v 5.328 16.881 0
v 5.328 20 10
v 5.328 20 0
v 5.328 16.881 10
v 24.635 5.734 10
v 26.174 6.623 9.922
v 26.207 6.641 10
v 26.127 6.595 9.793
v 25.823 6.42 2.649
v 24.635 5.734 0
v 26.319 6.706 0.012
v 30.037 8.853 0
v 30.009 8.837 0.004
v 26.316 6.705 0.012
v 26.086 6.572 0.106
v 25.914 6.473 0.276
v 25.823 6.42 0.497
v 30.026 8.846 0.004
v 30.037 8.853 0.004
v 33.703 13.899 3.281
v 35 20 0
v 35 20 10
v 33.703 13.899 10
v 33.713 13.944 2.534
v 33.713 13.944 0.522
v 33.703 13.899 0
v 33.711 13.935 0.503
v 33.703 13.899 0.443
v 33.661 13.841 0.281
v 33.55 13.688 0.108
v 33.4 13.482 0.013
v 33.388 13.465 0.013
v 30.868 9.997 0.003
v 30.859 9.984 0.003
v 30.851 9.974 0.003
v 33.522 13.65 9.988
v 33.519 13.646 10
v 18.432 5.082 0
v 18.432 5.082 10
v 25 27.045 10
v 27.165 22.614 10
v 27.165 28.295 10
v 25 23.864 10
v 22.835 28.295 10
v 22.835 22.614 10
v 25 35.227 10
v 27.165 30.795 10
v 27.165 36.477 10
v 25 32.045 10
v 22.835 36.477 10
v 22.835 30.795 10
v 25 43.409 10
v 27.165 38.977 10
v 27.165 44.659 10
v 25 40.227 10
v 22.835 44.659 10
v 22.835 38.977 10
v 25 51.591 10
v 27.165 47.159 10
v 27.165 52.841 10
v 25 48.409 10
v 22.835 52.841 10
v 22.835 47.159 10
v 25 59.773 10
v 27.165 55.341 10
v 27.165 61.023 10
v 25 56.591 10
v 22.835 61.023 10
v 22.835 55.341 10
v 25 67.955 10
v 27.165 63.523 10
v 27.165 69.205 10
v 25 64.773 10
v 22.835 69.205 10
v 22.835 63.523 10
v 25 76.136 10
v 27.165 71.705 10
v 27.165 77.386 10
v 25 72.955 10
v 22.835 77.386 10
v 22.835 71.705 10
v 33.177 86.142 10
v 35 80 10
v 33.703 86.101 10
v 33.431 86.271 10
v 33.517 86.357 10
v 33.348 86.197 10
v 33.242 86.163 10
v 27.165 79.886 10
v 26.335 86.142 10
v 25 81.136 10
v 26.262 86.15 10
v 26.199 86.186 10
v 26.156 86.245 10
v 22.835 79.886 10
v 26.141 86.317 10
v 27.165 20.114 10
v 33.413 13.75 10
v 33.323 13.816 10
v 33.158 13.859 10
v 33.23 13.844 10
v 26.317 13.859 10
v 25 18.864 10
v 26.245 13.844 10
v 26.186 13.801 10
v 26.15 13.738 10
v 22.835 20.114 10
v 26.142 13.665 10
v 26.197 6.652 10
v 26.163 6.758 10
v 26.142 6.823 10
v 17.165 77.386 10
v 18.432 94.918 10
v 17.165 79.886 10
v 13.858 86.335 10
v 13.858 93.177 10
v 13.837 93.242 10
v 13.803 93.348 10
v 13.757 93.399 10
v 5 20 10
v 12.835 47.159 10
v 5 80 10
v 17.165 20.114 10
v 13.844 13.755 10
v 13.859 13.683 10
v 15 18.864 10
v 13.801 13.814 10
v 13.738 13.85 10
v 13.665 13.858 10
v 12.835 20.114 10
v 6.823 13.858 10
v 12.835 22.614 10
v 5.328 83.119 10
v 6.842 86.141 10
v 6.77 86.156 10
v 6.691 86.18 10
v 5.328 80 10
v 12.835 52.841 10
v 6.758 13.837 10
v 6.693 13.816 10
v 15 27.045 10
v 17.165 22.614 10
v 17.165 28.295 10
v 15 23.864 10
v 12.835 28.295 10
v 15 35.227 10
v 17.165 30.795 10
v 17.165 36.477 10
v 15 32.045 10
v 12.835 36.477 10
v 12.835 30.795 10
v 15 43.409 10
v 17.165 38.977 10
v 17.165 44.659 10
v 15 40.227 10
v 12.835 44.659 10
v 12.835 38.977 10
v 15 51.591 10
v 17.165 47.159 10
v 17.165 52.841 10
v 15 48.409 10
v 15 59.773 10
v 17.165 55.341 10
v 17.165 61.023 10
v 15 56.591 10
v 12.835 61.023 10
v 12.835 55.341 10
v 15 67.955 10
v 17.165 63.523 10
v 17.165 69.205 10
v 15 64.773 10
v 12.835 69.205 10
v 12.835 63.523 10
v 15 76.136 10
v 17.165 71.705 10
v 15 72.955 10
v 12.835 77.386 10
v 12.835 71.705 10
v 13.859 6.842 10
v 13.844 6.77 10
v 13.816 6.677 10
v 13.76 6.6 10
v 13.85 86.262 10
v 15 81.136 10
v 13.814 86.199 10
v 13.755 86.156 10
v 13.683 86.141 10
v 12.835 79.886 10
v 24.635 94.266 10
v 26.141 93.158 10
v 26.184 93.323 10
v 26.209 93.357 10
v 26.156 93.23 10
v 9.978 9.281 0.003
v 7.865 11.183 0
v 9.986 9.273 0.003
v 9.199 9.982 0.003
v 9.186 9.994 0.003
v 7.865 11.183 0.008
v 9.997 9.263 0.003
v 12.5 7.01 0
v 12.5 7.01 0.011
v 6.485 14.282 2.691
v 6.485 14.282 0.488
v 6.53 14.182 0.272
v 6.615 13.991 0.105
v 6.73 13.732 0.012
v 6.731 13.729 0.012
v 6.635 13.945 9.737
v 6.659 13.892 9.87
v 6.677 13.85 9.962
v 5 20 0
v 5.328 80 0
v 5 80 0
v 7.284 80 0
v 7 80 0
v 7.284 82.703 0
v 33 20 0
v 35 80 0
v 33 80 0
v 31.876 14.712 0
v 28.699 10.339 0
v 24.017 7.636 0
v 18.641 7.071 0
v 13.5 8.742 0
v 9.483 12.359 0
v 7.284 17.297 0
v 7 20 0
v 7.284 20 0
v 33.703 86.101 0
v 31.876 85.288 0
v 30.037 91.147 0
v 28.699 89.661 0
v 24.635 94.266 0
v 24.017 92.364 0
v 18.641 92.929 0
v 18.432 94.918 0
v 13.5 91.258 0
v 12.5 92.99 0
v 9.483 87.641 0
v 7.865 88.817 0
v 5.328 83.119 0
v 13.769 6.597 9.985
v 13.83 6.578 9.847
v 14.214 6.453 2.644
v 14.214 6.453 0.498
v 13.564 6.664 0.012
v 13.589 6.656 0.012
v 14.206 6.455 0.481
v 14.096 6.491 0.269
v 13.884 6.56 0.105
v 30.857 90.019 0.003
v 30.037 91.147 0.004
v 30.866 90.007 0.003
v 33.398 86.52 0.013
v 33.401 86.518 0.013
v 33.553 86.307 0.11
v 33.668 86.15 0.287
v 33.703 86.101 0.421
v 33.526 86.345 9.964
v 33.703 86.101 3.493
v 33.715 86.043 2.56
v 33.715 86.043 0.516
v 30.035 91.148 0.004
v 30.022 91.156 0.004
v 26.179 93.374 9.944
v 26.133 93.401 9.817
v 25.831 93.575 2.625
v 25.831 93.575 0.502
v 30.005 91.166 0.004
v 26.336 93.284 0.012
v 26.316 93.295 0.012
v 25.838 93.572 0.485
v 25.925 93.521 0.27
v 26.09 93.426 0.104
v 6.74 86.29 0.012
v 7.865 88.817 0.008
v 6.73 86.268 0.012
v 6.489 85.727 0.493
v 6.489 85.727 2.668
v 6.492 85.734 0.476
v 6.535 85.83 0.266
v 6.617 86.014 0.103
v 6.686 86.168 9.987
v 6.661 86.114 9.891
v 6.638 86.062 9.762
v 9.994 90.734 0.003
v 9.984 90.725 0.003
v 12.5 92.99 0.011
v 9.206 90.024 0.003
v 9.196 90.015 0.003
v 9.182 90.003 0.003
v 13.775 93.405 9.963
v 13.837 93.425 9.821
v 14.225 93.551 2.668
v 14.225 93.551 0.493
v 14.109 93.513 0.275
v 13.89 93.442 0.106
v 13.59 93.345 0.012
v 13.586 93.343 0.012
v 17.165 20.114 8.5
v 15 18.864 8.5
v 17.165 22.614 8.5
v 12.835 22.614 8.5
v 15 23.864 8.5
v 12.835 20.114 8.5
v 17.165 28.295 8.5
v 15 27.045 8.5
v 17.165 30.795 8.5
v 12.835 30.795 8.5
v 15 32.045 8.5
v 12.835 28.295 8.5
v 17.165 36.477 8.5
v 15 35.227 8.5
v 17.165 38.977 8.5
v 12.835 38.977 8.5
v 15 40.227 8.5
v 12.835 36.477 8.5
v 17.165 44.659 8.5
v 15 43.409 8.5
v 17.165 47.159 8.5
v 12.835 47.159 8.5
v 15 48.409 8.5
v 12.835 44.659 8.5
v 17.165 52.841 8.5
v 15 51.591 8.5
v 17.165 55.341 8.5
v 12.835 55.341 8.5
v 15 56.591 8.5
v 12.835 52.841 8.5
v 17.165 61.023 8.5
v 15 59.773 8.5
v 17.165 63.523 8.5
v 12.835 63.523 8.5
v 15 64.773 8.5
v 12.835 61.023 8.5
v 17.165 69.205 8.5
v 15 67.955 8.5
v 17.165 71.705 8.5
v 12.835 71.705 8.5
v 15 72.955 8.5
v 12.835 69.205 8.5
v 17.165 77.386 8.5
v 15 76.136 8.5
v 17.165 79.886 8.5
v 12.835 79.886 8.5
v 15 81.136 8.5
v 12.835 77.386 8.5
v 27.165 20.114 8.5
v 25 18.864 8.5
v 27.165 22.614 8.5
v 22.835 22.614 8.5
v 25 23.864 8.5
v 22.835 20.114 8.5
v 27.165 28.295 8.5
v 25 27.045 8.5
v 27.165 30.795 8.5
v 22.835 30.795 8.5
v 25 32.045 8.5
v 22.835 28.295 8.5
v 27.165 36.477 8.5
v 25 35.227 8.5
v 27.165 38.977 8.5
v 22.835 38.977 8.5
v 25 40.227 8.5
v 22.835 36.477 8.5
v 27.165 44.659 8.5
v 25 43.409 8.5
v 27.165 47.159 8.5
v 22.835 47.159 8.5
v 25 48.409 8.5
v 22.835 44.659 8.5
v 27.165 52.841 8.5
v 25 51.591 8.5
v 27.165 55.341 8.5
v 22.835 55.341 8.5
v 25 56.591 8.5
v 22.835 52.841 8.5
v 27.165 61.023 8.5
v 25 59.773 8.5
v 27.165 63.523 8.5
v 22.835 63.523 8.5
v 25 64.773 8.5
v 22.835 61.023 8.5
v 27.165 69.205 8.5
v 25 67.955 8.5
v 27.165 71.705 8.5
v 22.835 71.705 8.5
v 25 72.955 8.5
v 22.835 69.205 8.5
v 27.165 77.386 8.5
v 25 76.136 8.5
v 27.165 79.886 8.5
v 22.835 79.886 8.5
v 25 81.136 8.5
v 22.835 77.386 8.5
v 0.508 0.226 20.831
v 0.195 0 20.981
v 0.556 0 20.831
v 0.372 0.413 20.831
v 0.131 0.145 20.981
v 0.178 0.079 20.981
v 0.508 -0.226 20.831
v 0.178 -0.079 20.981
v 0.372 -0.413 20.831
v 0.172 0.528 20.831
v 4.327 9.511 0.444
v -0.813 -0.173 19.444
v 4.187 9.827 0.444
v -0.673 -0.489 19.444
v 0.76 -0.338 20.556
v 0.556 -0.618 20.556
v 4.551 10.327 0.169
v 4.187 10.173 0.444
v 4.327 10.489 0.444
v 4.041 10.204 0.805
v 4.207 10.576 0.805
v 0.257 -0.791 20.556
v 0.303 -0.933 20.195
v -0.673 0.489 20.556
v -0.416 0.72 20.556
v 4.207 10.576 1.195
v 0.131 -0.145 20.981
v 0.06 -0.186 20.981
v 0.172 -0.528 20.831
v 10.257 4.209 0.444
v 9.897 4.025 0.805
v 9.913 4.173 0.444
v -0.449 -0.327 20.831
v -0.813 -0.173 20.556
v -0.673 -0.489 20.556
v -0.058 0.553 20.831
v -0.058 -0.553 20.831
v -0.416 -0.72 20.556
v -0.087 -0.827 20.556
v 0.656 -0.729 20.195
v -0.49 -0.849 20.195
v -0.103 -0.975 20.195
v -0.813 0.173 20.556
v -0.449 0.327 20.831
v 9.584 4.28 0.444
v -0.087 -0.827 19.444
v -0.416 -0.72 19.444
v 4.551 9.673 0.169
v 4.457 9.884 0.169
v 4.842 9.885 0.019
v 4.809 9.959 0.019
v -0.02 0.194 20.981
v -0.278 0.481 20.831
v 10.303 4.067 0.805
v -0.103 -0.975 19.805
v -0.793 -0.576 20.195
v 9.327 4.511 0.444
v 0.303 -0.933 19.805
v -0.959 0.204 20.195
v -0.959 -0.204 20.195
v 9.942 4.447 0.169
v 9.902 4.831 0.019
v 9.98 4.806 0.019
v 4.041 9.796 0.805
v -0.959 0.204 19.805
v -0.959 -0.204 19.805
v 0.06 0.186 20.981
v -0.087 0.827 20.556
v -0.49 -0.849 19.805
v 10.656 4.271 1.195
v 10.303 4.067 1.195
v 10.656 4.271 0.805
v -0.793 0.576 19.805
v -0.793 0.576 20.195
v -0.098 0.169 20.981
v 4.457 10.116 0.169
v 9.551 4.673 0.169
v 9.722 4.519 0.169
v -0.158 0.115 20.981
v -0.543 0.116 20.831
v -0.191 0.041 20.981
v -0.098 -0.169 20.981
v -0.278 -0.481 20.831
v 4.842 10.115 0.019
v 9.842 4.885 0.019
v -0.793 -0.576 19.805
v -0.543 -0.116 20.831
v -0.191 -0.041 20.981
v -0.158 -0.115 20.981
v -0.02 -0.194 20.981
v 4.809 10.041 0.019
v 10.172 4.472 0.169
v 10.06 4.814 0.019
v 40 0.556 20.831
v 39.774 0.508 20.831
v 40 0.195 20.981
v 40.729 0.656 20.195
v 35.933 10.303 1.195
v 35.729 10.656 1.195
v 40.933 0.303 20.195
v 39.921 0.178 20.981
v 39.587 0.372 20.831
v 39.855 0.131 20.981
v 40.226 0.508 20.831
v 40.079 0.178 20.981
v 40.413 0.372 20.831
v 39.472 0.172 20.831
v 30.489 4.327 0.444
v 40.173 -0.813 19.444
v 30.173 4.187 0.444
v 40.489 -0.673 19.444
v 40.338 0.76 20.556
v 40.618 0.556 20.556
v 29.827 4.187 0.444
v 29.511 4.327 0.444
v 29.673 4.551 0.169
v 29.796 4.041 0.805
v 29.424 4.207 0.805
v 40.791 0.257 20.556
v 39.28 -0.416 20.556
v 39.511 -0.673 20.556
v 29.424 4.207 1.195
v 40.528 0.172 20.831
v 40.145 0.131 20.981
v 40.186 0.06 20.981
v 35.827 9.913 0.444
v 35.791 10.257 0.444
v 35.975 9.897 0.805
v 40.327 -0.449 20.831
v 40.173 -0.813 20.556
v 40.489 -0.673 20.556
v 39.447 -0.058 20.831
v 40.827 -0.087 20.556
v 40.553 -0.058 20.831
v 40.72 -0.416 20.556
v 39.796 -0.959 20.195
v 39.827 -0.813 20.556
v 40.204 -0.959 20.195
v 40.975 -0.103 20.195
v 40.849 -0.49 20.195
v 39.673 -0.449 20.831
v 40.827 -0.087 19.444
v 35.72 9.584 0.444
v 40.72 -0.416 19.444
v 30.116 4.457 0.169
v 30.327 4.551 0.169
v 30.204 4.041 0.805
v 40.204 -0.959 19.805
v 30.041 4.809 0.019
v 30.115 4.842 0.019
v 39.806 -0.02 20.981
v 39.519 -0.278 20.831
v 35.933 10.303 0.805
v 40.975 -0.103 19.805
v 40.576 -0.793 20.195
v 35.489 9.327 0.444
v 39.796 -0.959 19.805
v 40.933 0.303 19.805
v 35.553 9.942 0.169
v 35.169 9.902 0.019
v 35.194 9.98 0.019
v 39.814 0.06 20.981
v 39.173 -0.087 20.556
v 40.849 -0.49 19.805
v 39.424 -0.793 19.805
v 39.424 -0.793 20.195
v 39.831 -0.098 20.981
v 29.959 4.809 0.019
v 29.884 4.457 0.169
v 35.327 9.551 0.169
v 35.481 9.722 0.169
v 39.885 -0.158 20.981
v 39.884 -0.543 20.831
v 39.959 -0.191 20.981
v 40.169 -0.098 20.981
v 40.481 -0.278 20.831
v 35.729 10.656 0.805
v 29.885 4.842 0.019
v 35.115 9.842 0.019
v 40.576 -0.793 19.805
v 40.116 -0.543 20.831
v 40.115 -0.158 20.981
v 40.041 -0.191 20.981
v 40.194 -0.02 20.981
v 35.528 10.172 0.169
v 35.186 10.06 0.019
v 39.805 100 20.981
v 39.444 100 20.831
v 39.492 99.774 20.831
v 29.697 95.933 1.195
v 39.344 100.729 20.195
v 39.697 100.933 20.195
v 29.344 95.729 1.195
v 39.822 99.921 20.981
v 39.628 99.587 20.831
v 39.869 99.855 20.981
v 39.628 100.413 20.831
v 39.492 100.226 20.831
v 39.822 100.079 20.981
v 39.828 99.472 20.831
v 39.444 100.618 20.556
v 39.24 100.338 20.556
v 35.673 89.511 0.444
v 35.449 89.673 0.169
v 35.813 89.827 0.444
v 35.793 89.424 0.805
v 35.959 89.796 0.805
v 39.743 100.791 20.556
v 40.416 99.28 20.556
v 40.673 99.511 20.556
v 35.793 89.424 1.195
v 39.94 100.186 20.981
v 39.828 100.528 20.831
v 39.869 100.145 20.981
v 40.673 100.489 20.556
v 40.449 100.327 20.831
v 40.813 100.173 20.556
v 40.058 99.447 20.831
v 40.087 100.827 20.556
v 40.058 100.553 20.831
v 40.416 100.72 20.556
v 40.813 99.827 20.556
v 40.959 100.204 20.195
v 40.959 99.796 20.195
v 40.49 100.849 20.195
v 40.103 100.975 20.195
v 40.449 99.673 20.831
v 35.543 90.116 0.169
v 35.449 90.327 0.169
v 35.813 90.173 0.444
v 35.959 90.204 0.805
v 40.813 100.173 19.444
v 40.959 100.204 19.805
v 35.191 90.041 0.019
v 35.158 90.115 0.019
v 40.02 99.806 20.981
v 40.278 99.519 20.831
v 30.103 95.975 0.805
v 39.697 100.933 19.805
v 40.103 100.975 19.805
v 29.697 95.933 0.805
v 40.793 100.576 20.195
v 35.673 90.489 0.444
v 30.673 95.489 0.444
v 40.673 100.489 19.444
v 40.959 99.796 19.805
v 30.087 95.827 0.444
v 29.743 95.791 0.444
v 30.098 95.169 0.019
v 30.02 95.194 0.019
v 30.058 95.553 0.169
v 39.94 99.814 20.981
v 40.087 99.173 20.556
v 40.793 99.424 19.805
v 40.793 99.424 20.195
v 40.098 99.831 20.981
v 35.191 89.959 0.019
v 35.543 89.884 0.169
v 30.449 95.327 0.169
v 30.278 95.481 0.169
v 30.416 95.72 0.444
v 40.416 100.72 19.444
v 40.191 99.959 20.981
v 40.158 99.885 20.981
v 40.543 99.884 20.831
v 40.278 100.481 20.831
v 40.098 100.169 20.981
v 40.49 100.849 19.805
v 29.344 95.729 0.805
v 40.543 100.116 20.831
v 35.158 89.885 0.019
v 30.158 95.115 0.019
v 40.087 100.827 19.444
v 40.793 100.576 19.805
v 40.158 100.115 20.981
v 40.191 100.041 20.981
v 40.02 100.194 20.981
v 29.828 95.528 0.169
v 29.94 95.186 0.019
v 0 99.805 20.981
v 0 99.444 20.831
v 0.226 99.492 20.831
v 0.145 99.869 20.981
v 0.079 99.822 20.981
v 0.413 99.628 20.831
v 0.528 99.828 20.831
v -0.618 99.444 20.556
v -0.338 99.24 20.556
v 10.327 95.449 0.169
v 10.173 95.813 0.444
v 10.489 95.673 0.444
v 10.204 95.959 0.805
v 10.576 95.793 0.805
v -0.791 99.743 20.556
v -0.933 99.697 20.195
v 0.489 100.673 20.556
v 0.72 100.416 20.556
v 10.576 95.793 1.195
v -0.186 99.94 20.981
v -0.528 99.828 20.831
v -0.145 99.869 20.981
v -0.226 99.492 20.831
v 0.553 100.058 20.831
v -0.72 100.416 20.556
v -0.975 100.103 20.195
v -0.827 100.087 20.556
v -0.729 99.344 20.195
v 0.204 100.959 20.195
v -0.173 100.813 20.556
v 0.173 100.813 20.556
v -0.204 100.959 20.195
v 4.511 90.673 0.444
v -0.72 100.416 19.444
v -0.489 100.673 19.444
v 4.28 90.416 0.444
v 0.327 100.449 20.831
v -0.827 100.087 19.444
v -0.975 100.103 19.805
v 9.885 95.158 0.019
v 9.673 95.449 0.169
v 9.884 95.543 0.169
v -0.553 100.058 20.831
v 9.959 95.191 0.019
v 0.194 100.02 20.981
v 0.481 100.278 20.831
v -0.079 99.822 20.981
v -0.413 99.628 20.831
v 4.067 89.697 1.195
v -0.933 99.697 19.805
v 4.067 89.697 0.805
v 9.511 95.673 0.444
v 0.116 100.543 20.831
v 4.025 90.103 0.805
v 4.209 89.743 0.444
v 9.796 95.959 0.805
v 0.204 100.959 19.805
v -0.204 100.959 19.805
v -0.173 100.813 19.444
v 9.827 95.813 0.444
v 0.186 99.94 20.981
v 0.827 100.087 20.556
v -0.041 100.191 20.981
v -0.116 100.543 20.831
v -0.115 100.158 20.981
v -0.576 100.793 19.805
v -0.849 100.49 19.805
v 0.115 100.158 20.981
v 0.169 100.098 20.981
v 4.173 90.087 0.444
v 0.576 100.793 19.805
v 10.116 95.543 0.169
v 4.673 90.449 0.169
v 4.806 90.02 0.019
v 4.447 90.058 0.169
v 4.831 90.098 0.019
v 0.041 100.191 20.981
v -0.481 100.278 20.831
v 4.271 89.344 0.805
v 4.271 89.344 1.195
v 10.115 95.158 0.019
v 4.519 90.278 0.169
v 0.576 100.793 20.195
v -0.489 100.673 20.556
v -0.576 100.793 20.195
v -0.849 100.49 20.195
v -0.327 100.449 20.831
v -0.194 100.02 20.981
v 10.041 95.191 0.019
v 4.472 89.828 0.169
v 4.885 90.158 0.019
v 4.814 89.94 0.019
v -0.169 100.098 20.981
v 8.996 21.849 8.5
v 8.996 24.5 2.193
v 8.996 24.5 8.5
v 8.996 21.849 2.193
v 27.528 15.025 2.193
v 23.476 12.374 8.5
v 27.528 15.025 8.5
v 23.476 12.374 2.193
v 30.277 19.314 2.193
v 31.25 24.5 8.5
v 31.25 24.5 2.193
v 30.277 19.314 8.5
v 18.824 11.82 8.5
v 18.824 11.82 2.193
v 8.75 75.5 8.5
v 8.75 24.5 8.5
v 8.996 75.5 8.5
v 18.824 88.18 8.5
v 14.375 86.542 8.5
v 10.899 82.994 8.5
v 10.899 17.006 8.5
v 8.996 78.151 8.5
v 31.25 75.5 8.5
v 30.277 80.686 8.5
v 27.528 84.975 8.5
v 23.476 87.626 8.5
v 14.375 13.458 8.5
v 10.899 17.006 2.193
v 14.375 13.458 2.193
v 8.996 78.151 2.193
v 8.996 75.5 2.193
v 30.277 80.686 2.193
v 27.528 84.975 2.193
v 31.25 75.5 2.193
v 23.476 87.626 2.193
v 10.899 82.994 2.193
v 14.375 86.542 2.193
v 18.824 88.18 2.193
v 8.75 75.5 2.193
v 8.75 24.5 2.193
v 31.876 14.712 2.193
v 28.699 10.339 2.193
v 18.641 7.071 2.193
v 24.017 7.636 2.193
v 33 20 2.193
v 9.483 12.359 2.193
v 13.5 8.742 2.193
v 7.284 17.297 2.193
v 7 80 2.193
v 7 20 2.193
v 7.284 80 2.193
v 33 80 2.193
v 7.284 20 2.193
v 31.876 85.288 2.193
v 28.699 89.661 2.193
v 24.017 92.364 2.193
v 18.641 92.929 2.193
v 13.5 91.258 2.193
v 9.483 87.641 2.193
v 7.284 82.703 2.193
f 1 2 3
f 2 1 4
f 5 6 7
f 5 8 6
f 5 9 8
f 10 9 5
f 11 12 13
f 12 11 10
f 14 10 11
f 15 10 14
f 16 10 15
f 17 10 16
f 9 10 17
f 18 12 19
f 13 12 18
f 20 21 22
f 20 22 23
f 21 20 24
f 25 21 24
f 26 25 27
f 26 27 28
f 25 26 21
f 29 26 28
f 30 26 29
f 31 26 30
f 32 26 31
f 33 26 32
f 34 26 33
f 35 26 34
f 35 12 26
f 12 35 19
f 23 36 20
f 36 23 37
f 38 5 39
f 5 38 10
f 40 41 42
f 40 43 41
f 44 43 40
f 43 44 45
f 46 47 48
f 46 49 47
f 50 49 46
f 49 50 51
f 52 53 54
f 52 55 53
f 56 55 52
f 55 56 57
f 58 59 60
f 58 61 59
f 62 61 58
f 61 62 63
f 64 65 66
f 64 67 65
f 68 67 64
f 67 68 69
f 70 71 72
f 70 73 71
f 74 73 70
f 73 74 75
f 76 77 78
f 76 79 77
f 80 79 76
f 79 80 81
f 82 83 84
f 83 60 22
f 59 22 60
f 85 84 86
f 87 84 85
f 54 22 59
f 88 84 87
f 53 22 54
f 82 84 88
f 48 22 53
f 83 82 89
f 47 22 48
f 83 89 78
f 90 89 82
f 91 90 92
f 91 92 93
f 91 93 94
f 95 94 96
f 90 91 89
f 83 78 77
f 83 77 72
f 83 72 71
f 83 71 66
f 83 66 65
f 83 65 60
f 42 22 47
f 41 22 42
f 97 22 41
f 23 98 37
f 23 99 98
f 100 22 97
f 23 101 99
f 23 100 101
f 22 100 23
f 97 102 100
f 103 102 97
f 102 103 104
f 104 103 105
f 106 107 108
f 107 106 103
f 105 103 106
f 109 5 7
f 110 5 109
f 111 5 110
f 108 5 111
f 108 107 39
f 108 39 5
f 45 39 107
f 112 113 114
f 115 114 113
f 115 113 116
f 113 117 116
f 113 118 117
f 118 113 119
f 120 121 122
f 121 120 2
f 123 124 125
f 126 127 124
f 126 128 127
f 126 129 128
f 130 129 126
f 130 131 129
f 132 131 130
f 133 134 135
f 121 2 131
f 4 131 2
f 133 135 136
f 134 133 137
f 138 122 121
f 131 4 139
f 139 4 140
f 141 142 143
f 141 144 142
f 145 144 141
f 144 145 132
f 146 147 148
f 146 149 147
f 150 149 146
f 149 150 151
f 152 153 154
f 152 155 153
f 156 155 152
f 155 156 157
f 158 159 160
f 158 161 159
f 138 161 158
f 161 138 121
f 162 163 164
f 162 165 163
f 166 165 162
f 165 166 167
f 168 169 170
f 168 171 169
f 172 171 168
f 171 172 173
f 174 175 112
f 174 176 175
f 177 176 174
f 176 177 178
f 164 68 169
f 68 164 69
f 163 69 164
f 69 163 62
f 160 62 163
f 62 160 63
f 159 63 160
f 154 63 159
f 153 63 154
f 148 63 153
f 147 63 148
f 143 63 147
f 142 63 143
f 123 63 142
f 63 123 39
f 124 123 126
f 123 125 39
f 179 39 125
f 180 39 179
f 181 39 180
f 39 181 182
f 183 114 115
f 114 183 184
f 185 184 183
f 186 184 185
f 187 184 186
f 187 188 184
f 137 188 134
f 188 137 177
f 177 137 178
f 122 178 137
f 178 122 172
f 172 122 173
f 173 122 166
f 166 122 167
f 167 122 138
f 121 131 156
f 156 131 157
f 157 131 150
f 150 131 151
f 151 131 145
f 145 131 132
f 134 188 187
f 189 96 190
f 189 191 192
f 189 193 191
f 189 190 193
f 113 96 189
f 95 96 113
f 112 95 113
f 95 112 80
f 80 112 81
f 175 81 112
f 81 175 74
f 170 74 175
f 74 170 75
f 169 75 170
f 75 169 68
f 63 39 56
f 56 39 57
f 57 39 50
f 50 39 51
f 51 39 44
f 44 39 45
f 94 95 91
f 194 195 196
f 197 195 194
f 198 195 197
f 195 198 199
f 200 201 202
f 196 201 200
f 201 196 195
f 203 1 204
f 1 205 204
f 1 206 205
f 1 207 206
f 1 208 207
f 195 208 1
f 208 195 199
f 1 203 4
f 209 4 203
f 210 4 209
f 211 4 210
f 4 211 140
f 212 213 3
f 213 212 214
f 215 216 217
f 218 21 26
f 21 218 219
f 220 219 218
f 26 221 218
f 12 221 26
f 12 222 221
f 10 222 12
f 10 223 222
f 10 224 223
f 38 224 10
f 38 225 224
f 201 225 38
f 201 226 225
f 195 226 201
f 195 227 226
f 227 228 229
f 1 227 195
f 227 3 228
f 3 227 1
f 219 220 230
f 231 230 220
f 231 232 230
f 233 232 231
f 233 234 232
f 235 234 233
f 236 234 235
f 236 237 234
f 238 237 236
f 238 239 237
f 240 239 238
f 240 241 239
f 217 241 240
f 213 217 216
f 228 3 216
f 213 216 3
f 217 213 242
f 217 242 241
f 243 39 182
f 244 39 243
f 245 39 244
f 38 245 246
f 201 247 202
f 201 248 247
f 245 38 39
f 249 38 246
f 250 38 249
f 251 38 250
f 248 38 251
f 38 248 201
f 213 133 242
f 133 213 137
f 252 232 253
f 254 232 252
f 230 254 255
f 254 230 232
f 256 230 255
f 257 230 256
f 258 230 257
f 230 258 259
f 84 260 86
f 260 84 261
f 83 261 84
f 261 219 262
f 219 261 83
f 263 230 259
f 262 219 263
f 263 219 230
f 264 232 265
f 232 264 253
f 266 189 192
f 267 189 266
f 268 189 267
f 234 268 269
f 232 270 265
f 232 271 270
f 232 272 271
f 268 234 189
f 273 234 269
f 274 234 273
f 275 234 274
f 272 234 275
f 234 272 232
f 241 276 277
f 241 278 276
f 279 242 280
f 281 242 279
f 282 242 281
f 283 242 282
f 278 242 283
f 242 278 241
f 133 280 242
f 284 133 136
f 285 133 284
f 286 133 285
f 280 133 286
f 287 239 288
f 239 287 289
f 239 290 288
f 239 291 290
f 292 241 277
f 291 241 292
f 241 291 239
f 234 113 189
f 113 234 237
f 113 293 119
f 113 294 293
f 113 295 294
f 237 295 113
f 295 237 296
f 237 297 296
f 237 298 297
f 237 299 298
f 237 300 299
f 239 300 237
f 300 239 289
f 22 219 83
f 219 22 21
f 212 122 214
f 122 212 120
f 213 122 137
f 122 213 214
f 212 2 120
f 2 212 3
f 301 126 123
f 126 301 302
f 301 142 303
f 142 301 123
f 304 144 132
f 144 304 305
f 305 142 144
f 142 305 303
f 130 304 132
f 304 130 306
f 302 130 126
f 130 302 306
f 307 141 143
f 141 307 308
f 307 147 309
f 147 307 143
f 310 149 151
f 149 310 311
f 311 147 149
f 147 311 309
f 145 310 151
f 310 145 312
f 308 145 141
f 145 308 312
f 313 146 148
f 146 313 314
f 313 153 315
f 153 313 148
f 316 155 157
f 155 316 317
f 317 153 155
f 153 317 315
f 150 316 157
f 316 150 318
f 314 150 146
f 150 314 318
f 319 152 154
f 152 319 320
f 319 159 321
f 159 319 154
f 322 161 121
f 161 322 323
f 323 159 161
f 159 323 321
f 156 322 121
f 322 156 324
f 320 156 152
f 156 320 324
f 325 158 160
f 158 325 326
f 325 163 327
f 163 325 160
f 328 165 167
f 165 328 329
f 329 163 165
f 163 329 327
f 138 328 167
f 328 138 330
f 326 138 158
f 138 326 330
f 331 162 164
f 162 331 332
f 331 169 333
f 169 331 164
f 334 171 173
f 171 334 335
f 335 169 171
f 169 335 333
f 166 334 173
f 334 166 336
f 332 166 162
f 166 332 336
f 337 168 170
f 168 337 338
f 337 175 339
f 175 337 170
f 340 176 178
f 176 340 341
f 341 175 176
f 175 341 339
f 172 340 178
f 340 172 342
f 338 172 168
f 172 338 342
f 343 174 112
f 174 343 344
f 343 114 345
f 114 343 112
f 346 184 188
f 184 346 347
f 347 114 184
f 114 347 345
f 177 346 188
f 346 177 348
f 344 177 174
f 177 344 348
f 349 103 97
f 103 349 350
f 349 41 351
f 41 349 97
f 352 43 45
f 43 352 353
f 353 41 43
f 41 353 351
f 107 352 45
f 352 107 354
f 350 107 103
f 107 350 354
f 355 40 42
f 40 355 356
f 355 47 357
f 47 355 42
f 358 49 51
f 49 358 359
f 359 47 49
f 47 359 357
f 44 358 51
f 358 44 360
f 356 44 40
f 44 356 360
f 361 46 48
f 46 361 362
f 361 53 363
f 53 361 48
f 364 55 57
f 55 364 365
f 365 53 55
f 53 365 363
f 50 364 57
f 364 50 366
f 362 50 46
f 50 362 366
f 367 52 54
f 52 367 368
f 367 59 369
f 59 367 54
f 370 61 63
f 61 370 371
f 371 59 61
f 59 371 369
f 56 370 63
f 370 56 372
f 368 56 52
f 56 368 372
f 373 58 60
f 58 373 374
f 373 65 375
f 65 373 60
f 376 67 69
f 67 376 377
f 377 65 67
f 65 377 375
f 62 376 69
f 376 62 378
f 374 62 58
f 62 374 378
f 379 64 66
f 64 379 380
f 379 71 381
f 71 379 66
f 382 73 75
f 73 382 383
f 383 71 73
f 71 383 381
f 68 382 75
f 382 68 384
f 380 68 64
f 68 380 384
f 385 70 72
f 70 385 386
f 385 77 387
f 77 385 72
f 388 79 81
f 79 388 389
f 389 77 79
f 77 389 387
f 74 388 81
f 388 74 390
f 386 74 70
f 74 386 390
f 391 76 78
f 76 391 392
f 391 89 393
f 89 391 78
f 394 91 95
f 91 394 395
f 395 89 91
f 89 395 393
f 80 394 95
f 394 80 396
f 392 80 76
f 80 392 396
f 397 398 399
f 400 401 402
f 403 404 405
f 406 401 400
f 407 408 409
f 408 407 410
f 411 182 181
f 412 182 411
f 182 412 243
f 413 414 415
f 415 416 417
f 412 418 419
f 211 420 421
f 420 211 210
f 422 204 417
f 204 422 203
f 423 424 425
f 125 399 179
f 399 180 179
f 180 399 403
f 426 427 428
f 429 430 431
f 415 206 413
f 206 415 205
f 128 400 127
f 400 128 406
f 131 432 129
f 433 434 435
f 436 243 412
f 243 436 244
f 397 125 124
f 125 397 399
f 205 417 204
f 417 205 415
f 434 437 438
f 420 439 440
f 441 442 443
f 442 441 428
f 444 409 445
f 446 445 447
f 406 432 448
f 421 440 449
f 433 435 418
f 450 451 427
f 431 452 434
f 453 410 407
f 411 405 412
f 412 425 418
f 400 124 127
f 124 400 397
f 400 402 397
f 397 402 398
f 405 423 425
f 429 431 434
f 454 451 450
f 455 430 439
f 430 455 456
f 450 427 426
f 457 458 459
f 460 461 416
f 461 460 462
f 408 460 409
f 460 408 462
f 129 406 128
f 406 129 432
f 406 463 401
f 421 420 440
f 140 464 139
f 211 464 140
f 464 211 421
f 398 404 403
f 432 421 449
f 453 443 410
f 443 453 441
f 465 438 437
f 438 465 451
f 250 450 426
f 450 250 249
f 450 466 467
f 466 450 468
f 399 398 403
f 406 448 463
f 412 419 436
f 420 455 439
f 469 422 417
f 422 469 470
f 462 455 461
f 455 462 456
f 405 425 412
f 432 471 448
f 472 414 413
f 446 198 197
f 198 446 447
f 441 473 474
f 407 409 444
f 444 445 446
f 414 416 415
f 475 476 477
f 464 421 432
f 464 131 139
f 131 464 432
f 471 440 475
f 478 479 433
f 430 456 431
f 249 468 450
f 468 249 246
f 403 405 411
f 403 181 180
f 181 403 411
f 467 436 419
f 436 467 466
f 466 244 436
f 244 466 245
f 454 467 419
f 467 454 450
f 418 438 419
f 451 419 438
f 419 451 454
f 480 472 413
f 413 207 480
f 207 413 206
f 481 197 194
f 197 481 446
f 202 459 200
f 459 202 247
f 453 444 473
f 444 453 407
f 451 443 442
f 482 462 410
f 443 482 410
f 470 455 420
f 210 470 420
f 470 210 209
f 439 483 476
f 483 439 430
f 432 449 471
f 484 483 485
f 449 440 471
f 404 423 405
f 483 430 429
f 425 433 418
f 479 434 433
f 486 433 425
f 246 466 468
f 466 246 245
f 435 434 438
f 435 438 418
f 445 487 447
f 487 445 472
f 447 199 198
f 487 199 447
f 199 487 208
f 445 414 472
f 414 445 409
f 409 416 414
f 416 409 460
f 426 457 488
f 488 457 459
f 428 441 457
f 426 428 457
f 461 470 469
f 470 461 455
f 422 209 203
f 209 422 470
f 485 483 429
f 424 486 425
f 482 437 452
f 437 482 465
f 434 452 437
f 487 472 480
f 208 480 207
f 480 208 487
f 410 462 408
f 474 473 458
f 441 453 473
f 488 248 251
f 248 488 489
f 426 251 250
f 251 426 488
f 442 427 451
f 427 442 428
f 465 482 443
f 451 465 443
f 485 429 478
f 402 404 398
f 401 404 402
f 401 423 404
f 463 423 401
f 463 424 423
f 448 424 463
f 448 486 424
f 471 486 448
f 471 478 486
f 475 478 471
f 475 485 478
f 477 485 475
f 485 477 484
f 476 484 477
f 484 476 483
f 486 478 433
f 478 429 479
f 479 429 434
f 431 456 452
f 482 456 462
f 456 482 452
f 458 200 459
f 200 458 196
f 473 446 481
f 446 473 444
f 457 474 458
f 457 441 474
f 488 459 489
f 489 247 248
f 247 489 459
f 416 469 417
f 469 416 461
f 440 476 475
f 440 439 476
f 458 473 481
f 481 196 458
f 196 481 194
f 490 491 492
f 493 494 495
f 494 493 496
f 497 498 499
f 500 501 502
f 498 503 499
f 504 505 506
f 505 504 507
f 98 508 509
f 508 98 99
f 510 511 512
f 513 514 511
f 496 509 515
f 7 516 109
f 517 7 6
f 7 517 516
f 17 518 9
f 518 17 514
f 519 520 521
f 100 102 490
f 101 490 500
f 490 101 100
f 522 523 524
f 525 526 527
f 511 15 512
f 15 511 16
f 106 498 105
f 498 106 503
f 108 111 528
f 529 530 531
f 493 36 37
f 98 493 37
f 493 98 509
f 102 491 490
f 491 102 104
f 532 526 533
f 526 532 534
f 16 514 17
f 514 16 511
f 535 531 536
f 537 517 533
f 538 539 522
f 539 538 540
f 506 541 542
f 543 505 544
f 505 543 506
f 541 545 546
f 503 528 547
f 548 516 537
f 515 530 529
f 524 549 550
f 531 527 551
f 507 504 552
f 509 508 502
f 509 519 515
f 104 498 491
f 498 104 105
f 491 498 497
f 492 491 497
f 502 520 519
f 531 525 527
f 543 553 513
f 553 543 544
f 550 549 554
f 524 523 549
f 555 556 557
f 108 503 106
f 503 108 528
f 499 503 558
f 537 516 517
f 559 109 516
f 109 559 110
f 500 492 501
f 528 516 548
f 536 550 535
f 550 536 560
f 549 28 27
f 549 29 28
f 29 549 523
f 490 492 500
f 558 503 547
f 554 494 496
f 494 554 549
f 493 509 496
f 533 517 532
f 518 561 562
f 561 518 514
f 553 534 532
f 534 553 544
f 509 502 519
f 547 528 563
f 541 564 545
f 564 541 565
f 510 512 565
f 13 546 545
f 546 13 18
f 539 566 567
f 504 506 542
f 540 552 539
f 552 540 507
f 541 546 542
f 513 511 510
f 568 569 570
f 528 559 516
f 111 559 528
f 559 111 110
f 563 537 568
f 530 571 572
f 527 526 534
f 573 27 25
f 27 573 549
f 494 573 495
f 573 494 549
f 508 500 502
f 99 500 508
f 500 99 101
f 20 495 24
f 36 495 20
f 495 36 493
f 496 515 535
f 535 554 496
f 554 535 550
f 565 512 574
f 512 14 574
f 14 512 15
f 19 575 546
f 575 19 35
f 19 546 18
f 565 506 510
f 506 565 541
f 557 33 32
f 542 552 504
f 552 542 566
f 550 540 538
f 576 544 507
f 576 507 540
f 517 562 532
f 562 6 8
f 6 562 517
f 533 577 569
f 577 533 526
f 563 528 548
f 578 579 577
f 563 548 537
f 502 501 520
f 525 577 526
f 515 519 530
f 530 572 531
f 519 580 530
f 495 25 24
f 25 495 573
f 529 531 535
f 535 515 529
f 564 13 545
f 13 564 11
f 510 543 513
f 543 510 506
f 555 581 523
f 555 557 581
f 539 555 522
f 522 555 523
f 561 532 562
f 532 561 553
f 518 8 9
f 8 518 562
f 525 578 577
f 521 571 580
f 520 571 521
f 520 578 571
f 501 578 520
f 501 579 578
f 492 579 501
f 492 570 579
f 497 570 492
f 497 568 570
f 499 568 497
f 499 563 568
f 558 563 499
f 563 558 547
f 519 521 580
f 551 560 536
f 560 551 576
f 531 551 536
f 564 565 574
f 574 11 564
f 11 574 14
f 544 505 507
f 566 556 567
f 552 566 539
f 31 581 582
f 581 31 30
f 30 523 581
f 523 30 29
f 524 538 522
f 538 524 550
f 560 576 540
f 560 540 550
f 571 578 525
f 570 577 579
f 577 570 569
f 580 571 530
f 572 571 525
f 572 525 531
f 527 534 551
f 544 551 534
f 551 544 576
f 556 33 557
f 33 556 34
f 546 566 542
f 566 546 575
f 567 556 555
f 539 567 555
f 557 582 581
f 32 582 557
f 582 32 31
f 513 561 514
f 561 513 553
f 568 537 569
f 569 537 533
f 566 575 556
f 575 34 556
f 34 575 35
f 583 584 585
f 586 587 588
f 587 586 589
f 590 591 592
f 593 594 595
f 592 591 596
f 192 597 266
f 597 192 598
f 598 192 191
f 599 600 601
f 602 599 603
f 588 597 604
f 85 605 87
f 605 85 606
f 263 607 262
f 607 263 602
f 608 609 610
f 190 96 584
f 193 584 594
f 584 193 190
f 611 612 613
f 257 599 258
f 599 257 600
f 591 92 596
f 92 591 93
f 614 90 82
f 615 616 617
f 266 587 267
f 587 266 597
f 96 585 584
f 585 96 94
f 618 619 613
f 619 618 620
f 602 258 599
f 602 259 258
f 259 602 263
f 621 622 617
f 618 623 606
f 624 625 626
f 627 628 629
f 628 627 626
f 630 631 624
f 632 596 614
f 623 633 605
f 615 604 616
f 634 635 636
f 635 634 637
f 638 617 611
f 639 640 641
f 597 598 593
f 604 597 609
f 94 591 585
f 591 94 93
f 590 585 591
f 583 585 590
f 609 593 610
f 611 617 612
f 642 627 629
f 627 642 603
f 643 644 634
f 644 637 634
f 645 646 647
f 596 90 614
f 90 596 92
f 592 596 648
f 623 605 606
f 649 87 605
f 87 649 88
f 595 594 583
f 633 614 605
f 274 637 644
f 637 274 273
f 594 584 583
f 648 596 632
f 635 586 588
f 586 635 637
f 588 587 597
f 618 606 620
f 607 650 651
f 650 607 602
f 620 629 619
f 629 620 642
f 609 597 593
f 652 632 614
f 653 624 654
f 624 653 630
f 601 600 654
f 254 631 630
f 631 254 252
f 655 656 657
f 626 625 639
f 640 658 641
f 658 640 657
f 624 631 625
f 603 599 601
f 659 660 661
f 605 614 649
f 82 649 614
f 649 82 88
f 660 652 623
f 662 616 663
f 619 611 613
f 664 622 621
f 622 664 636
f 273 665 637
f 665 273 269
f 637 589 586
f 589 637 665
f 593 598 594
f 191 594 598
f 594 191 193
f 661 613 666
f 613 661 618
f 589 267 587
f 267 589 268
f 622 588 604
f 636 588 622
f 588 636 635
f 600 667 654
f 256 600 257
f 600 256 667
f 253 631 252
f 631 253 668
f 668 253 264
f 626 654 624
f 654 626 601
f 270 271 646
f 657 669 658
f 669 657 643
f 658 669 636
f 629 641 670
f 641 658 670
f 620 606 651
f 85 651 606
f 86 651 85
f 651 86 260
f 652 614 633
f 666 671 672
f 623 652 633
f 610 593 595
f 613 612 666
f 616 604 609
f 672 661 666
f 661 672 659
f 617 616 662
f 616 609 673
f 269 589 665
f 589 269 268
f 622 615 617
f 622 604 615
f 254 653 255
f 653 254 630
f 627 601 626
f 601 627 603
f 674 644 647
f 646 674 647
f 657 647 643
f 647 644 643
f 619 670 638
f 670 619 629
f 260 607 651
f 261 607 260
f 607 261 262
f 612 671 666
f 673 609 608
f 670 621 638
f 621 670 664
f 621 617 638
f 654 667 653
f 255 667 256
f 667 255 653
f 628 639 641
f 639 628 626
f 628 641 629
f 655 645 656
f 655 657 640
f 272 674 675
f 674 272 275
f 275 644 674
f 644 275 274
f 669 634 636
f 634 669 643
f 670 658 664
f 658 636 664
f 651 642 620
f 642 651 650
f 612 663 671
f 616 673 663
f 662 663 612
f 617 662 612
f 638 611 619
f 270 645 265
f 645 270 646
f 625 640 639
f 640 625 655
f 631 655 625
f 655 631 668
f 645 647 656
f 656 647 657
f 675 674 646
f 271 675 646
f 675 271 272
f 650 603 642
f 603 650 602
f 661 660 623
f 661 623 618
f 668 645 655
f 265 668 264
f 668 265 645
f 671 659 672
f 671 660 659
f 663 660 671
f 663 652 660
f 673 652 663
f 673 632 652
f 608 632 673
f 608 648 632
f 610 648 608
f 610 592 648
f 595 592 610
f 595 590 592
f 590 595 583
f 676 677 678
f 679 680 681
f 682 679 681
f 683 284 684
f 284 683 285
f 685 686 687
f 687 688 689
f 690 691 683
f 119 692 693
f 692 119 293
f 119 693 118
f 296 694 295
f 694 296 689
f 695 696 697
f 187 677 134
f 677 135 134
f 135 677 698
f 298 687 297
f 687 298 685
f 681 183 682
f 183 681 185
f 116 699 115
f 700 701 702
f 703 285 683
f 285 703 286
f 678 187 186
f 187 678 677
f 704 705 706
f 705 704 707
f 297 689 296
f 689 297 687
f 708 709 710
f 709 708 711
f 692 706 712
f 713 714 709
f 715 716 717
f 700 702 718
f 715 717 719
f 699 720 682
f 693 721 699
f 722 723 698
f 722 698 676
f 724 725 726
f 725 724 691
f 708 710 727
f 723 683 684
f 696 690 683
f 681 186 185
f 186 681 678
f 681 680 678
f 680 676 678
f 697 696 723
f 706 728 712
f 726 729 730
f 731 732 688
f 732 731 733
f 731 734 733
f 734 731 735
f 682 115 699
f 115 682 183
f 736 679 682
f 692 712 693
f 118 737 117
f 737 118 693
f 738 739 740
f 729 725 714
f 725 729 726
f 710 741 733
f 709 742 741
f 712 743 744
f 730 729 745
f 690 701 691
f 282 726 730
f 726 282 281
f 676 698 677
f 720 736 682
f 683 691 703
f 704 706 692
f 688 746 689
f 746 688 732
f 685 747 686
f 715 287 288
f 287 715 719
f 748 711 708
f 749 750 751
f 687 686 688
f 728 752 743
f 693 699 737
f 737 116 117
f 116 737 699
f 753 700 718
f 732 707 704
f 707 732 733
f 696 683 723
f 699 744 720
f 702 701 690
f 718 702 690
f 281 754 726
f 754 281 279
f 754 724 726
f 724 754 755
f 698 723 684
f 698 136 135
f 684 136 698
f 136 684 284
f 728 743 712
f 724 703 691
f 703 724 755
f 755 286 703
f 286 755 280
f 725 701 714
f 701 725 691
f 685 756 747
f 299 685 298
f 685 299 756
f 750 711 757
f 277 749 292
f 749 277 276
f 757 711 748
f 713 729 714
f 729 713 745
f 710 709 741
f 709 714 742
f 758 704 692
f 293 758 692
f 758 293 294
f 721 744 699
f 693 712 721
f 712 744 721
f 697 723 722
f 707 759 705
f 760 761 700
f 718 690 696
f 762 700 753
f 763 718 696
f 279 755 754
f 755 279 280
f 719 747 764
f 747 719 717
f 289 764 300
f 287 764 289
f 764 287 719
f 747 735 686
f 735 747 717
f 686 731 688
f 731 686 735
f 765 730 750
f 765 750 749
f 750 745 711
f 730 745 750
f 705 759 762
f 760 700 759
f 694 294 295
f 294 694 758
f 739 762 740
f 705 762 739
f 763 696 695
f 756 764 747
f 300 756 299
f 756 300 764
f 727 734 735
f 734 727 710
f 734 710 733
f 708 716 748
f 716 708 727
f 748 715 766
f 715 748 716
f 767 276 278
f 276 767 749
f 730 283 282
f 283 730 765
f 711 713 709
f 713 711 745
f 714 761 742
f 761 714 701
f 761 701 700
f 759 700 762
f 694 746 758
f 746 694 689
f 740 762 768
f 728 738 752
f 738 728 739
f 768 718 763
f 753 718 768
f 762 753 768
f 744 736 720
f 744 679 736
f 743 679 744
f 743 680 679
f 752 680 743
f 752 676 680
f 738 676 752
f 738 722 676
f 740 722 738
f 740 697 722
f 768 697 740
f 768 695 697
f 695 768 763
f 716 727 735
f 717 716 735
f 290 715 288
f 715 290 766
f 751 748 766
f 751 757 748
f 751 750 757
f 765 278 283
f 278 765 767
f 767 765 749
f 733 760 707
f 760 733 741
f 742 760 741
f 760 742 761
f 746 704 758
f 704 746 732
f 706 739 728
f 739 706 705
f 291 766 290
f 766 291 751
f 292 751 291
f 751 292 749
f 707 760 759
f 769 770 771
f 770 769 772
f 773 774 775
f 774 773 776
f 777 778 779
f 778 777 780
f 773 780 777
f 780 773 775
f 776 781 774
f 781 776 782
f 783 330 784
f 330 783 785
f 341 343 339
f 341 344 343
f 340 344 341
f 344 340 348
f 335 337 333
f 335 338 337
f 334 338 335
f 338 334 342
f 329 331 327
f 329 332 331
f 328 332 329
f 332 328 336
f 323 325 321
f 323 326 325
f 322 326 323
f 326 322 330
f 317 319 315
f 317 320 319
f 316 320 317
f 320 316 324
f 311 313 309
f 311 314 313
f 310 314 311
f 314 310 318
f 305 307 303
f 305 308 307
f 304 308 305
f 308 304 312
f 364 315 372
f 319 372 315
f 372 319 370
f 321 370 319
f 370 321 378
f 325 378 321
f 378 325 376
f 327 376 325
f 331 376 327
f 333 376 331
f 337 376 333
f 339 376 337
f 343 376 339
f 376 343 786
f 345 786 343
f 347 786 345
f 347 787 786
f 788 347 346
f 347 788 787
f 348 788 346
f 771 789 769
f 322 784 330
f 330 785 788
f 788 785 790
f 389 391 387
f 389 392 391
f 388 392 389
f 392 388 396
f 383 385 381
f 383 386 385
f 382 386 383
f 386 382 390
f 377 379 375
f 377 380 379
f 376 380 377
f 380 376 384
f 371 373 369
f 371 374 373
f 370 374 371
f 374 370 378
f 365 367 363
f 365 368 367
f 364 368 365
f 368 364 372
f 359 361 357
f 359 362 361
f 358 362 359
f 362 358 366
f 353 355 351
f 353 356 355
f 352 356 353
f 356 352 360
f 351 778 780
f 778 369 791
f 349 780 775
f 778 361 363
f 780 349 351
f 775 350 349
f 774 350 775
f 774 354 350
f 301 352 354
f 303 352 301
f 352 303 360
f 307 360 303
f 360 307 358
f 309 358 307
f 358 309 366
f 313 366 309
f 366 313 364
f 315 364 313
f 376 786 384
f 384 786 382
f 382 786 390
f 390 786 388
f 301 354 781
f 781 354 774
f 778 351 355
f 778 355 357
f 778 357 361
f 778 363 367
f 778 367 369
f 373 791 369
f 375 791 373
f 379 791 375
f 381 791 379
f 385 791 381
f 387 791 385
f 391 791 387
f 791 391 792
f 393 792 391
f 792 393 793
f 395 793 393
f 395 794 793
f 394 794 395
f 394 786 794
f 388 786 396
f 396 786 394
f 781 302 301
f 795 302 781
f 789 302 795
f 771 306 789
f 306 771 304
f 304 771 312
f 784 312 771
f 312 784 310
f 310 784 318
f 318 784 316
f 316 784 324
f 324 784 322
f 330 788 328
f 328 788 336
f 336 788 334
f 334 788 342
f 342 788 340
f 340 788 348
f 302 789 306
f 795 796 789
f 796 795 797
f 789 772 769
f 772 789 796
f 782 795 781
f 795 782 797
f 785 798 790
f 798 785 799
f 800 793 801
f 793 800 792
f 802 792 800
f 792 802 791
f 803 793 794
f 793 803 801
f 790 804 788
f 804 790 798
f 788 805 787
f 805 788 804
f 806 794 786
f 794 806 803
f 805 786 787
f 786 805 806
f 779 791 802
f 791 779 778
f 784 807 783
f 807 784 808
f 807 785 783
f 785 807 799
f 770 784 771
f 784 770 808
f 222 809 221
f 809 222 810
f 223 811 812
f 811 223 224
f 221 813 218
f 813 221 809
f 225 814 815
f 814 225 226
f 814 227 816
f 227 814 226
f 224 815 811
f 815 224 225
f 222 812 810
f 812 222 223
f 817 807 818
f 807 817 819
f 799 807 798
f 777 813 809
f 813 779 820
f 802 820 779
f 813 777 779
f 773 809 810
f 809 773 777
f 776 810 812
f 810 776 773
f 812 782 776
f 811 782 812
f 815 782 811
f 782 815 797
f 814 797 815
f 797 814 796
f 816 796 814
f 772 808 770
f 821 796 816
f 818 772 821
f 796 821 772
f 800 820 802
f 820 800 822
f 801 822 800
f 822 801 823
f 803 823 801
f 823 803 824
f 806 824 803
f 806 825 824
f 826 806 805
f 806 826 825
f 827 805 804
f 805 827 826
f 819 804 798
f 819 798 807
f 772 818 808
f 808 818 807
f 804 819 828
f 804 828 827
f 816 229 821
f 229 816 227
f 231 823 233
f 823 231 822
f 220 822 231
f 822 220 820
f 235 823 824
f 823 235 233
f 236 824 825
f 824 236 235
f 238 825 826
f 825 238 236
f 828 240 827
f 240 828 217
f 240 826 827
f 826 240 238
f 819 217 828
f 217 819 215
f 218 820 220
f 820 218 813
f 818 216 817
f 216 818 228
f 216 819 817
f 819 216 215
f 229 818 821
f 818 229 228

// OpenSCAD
// file: hydration_bladder_dryer_common.scad
// Note: This drives the width of the opening and the tube and must 
// be big enough (e.g. actual + 0.5mm) to prevent an overly tight fit.
blowerPortWidth=15.5;

// This dictates the strength of the tower tube.  It will be printed
// in layers, so this must be thick enough to not be overly fragile.
towerWallThickness=2;

// Outer measurement for the long side of the tube tower on the base
tubeTowerLength=35;

// Outer measurement for the short side of the tube tower on the base
tubeTowerWidth=blowerPortWidth+(towerWallThickness*2);
// file: box_tube_modules.scad
translate([50,0,0]) boxTube(20,35,50,1.5);

boxTubeReduction(20,35,2,0.5,75,20,15,0);

module boxTube(innerX, innerY, height, wallThickness) {
    internalOverlap=0.05;
    difference() {
        cube([innerX+wallThickness*2, innerY+wallThickness*2, height]);
        translate([wallThickness, wallThickness, -internalOverlap]) {
            cube([innerX, innerY, height+internalOverlap*2]);
        }
    }
}


/*
 * Creates a larger box tube into which another can insert
 * and a smaller box tube which would insert into the same
 * size opening as the larger box tube.
 *
 * The reason this is factored out as a module is that it
 * isn't trivial to "glue" the inner and outer boxes 
 * together.  Because this is intended to be used for 3D
 * printing, there must be some tolerance allowed for the
 * inner and outer pieces to actually fit together.  This
 * means the inner dimensions of the insertion box tube
 * must be slightly expanded, but the outer dimensions of
 * the smaller box tube cannot be.  This leaves a gap that
 * must be filled with a strategicly translated 3rd box tube
 * that is big enough to overlap both the inner and outer
 * surfaces of that gap and "glue" it together into the same
 * object, but only where the smaller and larger tubes intersect.
 * 
 * This is sorta how it looks in a cross section.
 *
 *        |             |  <--- inner
 *        |             |
 *      |||             |||
 *      |||             |||
 *      |\               /|
 *      | \             / |  <--- outer
 *      |  \__"glue"___/  |
 *
 * overlap = thin margin added to inner and outer dimensions
 *    to make the object merge with exact sized items in
 *    the model to which the object is returned.
 */
module boxTubeReduction(matedWidth, matedLength, 
        wallThickness, toleranceGap, 
        coreTubeLength, slipInsertionDepth,
        coreToSlipOverlapDepth, overlap) {
    internalOverlap=0.05;
    coreTubeInnerWidth=matedWidth-wallThickness*2;
    coreTubeInnerLength=matedLength-wallThickness*2;
    union() {
        boxTube(matedWidth+toleranceGap*2, 
                matedLength+toleranceGap*2, 
                slipInsertionDepth+coreToSlipOverlapDepth,
                wallThickness);
        // Since expanding the slip tube leaves a gap between it
        // and the outer surface of the core tube, the gap needs
        // to be filled to connect the model.
        // Note: The thickness of this tube is 1 * toleranceGap, 
        // but to overlap both outer and inner tubes, it expanded
        // by internalOverlap * 2 and positioned -1 * internalOverlap
        translate([wallThickness-internalOverlap,
                wallThickness-internalOverlap,
                slipInsertionDepth]) {
            // inner size starts at the core tube outer size (width or length
            // + 2x wall thickness) and is shrunk by 1 x slipTolerance, which is
            // really 2 * 1/2 * slipTolerance (i.e. 1/2 on each side * 2 sides).
            boxTube(matedWidth-internalOverlap*2,
                    matedLength-internalOverlap*2,
                    coreToSlipOverlapDepth,
                    toleranceGap+internalOverlap*2);
        }

        /* Core Part of Tube
         * Note: The slip tube internal size is adjusted by "overlap,"
         * so the core tube position must be centered by positioning at
         * -1 overlap in both X and Y directions.
         * Note: Length of core tube accounts for the slip overlap on both ends
         * and it is positioned lower by the slip overlap on one end.
         */
        translate([wallThickness+toleranceGap-overlap,
                wallThickness+toleranceGap-overlap,
                slipInsertionDepth]) {
            boxTube(coreTubeInnerWidth,
                    coreTubeInnerLength, 
                coreTubeLength,
                wallThickness+overlap);
        }
    }
}
// file: hydration_bladder_dryer_distributor_bottom.scad
use <box_tube_modules.scad>
include <hydration_bladder_dryer_common.scad>
include <hydration_bladder_dryer_distributor_common.scad>

renderResolution=10;
roundness = 1;
$fn=15;

overlap=0.007;

// Use this to move the intake port a bit to align it
// between the holes in the bottom plate.
intakeOffsetTuningAdjust=1.15;

distributorHeadHoleDia=6;
holeColumns=2;
holeRows=8;

plateThickness=2;

hullCenterSize=10;

bottomInsertInsetAmount=2;


lowerPlateThickness=2; 

cutoutSides=6;

intakePortHeight=15;

tubeInnerWidth=tubeTowerWidth-towerWallThickness*2;
tubeInnerLength=tubeTowerLength-towerWallThickness*2;

tubeSlipOverlap=5;
tubeSlipHeight=20;

intakeCenteringOffsetX=distributorHeadWidth/2-tubeTowerWidth/2;
intakeOffsetY = distributorHeadLength/5 + intakeOffsetTuningAdjust;

bottomPartInsertWidth=distributorHeadWidth-bottomPartInsetX*2;
bottomPartInsertLength=distributorHeadLength-bottomPartInsetY*2;

bottomPartInsertToleranceGap=0.5;  // mm
bottomPartInsertToleranceScaleX=(bottomPartInsertWidth-2*bottomPartInsertToleranceGap)/
        bottomPartInsertWidth;
bottomPartInsertToleranceScaleY=(bottomPartInsertLength-2*bottomPartInsertToleranceGap)/
        bottomPartInsertLength;
echo(concat("bottomPartInsertToleranceScaleX: ", bottomPartInsertToleranceScaleX));
echo(concat("bottomPartInsertToleranceScaleY: ", bottomPartInsertToleranceScaleY));

union() {
    difference() {
        union() {
            bottomPartSolid();
            translate([bottomPartInsetX+bottomPartInsertToleranceGap,
                    bottomPartInsetY+bottomPartInsertToleranceGap,
                    lowerPlateThickness-overlap]) {
                // Note: Scaling is done here because the raw
                // full-size bottomPartInsertSolid is used to
                // cut out the hole in the other part.
                scale([bottomPartInsertToleranceScaleX,
                        bottomPartInsertToleranceScaleY,1]) {
                    bottomPartInsertSolid();
                }
            }
        }
        // holes
        translate([0,0,-overlap])
            holes(holeColumns, holeRows, distributorHeadHoleDia, distributorHeadWidth, distributorHeadLength, 
                    lowerPlateThickness*2+overlap*2, 6, true);
        // intake opening
        translate([intakeCenteringOffsetX, 
                intakeOffsetY, -overlap])
            cube([tubeTowerWidth-overlap*2,
                tubeTowerLength-overlap*2,
                    lowerPlateThickness*2+overlap*2]);
    }
    slipTolerance=0.5;
    translate([intakeCenteringOffsetX-(towerWallThickness+slipTolerance),
            intakeOffsetY-(towerWallThickness+slipTolerance)+overlap,
            -tubeSlipHeight-intakePortHeight+lowerPlateThickness*2]) {
        boxTubeReduction(tubeTowerWidth,tubeTowerLength,
                towerWallThickness,slipTolerance,
                intakePortHeight,tubeSlipHeight,
                tubeSlipOverlap, overlap);
    }

}

module bottomPartSolid() {
    diskEndedPlate(distributorHeadWidth, distributorHeadLength, lowerPlateThickness);
}

// Note: This is used by the other half to cut the hole for it
//  so it is not reduced yet here.
module bottomPartInsertSolid() {
    diskEndedPlate(bottomPartInsertWidth, 
            bottomPartInsertLength, 
            lowerPlateThickness);
}
// file: hydration_bladder_dryer_distributor_common.scad
distributorHeadWidth=30;
distributorHeadLength=90;

bottomPartInsetX=2;
bottomPartInsetY=2;

/*
 * Cuts holes in a part that is arranged flat on X/Y plane
 * through a thickness of the z-size.
 */
module holes(columns, rows, dia, partXSize, partYSize, partZSize, 
        holePolySides, enableRotation) {
    // half of the angle for one side (divides 180, not 360)
    // Also note that the same thing CANNOT be done with an
    // if () {} statement here because the value assignment is
    // invisible outside the scope of the if block.
    // See: https://en.wikibooks.org/wiki/OpenSCAD_User_Manual/General#Scope_of_variables
    rotationAngle = (enableRotation) ? 180/holePolySides : 0;
    for (x = [1 : 1 : columns]) {
        // The low-y end starts at 2
        //    row 0 would be on the x-axis
        //    row 1 would be through the end with the spreader points
        // The high-y end stops at holeRows+1 to have the right number of rows.
        //    example: holeRows = 8 -> loops 2-9, so 2,3,4,5,6,7,8,9 == 8 rows
        for (y = [2 : 1 : rows+1]) {
            // The spacing of the rows adds 3 non-rows to start and finish
            //    between the spreader tip "end pieces"
            translate([
                    x*(partXSize/(columns+1)),
                    y*(partYSize/(rows+3)),
                    -overlap]) {
                rotate([0,0,rotationAngle]) {
                    cylinder(d=dia, h=partZSize+overlap*2, $fn=holePolySides);    
                }
            }
        }
    }
}

module diskEndedPlate(width, length, thickness) {
    union() {
        translate([width/2,width/2,0]) 
            cylinder(d=width, h=thickness);
        translate([width/2,length-width/2,0]) 
            cylinder(d=width, h=thickness);
        translate([0,width/2,0]) 
            cube([width, 
                length-width, thickness]);
    }
}
// main file
include <hydration_bladder_dryer_distributor_common.scad>
use <hydration_bladder_dryer_distributor_bottom.scad>

renderResolution=10;
roundness = 1;
$fn=15;

overlap=0.007;

spreaderTipHeight=20;

distributorHeadHoleDia=5;
holeColumns=2;
holeRows=8;

baseCornerInset=5;
baseThickness=10;
hullCenterSize=10;

innerAirPocketWidthPercent=0.75;
innerAirPocketLengthPercent=0.85;
innerAirPocketThicknessPercent=0.70;

cutoutSides=6;

innerAirPocketXOffset = ((1-innerAirPocketWidthPercent)/2)*distributorHeadWidth;
innerAirPocketYOffset = ((1-innerAirPocketLengthPercent)/2)*distributorHeadLength;
innerAirPocketZOffset = ((1-innerAirPocketThicknessPercent)/2)*baseThickness;

intakePortWidth=19;
intakePortLength=30;

difference() {
    difference() {  // cut out innerAirPocket
        union() {
            spreaderPoint(0, 0, 0);
            spreaderPoint(90, distributorHeadWidth+baseCornerInset*2, 0);
            spreaderPoint(180, distributorHeadWidth+baseCornerInset*2,
                   distributorHeadLength+baseCornerInset*2);
            spreaderPoint(270, 0, distributorHeadLength+baseCornerInset*2);

            // Base
            translate([baseCornerInset, baseCornerInset, 0])
            difference() {
                diskEndedPlate(distributorHeadWidth, 
                        distributorHeadLength, baseThickness); 
                // holes            
                holes(holeColumns, holeRows, distributorHeadHoleDia, 
                        distributorHeadWidth, distributorHeadLength, 
                        baseThickness, 6, true);
            }
        }
        translate([baseCornerInset, baseCornerInset, 0])
        translate([innerAirPocketXOffset, 
            innerAirPocketYOffset, 
            innerAirPocketZOffset])
        scale([innerAirPocketWidthPercent, innerAirPocketLengthPercent, 
                innerAirPocketThicknessPercent]) {
            diskEndedPlate(distributorHeadWidth, distributorHeadLength, 
                    baseThickness);     
        }
        
    }
    // TODO: Cut out for bottom part here.
    translate([baseCornerInset+bottomPartInsetX,
            baseCornerInset+bottomPartInsetY,-overlap])
        scale([1,1,1.1]) 
            bottomPartInsertSolid();
}

module intakePort() {
    cube([intakePortWidth, intakePortLength, baseThickness/4]);
}

module baseShape() {
    union() {
        translate([distributorHeadWidth/2,distributorHeadWidth/2,0]) 
            cylinder(d=distributorHeadWidth-baseCornerInset*2, h=baseThickness);
        translate([distributorHeadWidth/2,
                distributorHeadLength-distributorHeadWidth/2,0]) 
            cylinder(d=distributorHeadWidth-baseCornerInset*2, h=baseThickness);
        translate([baseCornerInset,distributorHeadWidth/2,0]) 
            cube([distributorHeadWidth-baseCornerInset*2, 
                distributorHeadLength-distributorHeadWidth, baseThickness]);
    }
}

module spreaderPoint(rotation, xOffset, yOffset) {
    translate([xOffset, yOffset, 0]) {
        rotate([0,0,rotation]) {
            hull() {
                translate([0, 0, spreaderTipHeight]) 
                    sphere(r=roundness);
                translate([baseCornerInset, baseCornerInset*2, roundness])
                    sphere(r=roundness);
                translate([baseCornerInset*2, baseCornerInset, roundness])
                    sphere(r=roundness);
                translate([distributorHeadWidth/2-hullCenterSize/2,distributorHeadWidth/2-hullCenterSize/2,0]) 
                    cube([hullCenterSize, hullCenterSize, baseThickness/2]);
            }
        }
    }
}
